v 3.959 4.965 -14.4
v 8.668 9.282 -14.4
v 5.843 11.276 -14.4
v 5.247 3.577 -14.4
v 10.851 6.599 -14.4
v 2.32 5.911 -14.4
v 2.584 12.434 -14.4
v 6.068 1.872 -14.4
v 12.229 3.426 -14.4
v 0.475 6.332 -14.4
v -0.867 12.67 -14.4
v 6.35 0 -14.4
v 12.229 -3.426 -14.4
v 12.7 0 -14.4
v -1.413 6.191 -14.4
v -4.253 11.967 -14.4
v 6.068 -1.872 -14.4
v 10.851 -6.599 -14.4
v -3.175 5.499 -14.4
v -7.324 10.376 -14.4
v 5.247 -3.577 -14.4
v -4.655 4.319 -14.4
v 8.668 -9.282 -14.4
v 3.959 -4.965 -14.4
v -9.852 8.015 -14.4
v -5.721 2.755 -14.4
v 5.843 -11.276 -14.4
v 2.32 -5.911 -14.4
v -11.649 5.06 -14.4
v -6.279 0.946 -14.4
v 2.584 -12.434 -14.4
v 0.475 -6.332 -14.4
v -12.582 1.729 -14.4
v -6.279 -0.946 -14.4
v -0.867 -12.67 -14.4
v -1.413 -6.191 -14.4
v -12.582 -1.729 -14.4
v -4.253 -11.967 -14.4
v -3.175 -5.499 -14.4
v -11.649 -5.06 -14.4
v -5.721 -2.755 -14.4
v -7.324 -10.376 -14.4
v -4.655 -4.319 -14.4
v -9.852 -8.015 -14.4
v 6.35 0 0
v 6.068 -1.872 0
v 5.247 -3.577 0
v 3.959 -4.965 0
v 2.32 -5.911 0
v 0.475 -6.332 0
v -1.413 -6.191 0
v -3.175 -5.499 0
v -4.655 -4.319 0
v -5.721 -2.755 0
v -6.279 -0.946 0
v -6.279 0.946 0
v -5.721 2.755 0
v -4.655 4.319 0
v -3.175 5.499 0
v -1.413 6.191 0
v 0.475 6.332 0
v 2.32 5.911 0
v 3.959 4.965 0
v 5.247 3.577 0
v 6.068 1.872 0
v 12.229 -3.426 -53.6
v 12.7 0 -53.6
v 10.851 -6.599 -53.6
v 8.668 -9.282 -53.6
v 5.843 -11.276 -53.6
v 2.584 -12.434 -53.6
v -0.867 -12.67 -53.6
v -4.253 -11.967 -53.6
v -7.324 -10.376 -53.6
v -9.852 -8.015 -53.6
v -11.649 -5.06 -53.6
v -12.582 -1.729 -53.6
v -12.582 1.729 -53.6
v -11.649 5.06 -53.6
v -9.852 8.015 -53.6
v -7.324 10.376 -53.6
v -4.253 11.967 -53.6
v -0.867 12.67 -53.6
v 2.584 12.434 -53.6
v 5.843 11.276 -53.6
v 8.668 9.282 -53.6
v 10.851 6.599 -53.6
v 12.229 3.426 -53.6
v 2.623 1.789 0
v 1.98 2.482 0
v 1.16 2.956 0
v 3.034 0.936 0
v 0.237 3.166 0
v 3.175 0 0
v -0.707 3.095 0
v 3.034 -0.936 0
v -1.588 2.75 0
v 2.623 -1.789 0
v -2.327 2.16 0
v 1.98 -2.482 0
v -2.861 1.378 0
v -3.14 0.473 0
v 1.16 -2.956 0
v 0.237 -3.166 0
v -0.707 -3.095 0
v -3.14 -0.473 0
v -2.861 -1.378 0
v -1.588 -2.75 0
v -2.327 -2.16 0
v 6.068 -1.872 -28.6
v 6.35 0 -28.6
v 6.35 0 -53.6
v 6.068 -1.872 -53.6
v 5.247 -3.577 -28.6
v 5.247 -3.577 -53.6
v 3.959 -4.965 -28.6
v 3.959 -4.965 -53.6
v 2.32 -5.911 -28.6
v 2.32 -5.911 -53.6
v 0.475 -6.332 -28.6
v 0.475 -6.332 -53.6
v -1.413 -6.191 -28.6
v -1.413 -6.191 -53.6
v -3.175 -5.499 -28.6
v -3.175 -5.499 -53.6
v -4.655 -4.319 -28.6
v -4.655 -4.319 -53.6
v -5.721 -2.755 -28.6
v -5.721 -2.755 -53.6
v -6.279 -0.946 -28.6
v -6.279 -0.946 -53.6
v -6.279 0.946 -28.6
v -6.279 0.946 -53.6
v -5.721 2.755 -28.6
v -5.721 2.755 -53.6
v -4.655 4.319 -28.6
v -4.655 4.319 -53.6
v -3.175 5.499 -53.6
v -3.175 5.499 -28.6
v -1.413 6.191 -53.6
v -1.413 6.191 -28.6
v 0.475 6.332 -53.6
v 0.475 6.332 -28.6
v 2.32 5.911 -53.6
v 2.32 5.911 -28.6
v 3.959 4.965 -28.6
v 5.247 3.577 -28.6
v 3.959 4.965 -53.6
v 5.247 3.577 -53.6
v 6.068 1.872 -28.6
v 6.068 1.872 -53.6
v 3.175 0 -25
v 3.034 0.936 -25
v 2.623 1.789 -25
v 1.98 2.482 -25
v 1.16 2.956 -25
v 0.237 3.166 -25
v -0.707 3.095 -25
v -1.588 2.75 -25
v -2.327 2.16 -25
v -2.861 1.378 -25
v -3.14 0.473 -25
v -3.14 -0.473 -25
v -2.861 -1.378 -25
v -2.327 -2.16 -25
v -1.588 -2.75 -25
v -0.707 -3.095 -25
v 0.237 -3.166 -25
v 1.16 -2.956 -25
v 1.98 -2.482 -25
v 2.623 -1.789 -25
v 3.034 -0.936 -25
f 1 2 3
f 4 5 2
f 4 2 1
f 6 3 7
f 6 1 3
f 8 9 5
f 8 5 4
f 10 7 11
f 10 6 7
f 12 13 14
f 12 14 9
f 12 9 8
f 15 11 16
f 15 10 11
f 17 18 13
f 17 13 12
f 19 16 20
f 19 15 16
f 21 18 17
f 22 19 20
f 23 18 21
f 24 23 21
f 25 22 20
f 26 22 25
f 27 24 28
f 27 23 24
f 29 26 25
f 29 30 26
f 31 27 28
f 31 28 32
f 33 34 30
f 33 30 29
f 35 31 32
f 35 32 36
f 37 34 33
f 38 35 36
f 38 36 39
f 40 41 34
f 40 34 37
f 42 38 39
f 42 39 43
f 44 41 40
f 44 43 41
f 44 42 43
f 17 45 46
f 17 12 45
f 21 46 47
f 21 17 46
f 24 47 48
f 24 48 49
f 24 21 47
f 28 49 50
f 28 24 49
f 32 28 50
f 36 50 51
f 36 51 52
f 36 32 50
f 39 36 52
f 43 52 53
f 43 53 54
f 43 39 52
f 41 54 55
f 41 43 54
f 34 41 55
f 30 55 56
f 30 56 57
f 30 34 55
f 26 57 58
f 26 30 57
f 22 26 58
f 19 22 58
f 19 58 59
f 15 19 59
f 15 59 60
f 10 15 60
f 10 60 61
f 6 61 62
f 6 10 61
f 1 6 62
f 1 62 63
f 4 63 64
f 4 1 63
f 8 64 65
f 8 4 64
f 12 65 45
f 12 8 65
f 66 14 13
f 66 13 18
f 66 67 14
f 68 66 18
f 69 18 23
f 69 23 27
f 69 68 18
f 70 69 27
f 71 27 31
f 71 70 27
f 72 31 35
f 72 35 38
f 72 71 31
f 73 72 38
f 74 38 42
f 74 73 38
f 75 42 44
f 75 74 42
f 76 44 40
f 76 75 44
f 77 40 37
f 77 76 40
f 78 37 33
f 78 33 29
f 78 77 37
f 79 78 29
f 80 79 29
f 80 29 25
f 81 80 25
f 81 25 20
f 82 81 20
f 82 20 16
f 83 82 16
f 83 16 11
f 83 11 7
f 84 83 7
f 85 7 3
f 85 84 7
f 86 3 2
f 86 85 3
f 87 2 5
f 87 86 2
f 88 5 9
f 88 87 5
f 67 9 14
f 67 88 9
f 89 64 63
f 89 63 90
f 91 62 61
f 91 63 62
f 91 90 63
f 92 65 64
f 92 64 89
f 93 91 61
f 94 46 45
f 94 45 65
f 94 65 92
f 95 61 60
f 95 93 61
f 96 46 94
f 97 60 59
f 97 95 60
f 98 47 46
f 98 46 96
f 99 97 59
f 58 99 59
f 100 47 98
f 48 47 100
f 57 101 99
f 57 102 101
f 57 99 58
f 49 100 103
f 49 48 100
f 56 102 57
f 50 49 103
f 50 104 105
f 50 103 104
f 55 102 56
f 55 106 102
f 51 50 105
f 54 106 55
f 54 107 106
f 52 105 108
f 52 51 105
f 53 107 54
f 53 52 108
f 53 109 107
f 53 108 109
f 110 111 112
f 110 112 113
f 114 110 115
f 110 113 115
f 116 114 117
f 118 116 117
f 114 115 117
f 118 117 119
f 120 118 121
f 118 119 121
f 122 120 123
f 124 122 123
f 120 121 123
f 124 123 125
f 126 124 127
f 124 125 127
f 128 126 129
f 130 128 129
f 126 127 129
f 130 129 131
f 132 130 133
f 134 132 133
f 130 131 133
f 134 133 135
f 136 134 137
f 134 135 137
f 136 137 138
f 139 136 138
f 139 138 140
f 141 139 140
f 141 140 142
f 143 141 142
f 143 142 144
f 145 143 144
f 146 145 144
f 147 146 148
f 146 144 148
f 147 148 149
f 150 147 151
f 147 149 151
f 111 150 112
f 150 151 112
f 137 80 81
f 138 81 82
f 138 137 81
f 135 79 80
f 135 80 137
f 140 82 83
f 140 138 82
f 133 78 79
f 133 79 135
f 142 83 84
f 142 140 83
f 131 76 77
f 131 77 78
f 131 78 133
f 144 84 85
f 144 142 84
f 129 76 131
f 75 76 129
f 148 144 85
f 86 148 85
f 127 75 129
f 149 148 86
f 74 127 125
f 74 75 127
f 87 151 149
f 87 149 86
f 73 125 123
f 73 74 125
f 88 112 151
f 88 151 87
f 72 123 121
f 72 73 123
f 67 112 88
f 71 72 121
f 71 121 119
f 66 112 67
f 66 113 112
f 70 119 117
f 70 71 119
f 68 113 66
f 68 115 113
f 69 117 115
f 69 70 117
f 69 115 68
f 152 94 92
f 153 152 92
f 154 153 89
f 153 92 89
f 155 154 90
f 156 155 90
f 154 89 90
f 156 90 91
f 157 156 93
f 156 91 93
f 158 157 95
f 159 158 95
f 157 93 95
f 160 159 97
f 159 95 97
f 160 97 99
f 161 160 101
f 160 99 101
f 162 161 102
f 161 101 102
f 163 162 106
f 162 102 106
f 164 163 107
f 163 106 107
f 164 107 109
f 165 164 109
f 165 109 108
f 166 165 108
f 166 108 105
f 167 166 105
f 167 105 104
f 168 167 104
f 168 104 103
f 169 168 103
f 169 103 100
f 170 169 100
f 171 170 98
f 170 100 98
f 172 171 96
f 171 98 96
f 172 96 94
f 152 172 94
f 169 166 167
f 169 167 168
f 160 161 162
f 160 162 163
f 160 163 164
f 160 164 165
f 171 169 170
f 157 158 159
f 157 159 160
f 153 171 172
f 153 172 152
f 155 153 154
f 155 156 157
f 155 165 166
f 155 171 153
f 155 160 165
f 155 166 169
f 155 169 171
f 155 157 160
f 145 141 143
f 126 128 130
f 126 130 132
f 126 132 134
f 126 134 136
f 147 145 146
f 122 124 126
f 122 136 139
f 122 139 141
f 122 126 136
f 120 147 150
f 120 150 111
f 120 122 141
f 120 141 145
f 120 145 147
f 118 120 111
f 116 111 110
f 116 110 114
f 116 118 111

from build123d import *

# Parameters (mm, degrees)
SKETCH2_R          = 3.175
CUT_EXTRUDE1_DEPTH = 25
SKETCH3_R          = 6.35
CUT_EXTRUDE2_DEPTH = 25


with BuildPart() as part:
    # Sketch1 → Revolve1 (revolve)
    with BuildSketch(Plane(origin=(0, 0, 0), x_dir=(0, 0, -1), z_dir=(1, 0, 0)), mode=Mode.PRIVATE) as revolve1_sk:
        Polygon((14.4, 6.35), (14.4, 12.7), (53.6, 12.7), (53.6, 0), (0, 0), (0, 6.35), align=None)
    revolve(revolve1_sk.sketch.rotate(Axis((0, 0, 0), (0, 0, -1)), 90), axis=Axis((0, 0, 0), (0, 0, -1)))

    # Sketch2 → Cut-Extrude1 (cut)
    with BuildSketch(Plane.XY):
        Circle(SKETCH2_R)
    extrude(amount=-CUT_EXTRUDE1_DEPTH, mode=Mode.SUBTRACT)

    # Sketch3 → Cut-Extrude2 (cut)
    with BuildSketch(Plane(origin=(0, 0, -53.6), x_dir=(-1, 0, 0), z_dir=(0, 0, -1))):
        with Locations(Location((0, 0, 0), (0, 0, 180))):
            Circle(SKETCH3_R)
    extrude(amount=-CUT_EXTRUDE2_DEPTH, mode=Mode.SUBTRACT)


solid = part.part
